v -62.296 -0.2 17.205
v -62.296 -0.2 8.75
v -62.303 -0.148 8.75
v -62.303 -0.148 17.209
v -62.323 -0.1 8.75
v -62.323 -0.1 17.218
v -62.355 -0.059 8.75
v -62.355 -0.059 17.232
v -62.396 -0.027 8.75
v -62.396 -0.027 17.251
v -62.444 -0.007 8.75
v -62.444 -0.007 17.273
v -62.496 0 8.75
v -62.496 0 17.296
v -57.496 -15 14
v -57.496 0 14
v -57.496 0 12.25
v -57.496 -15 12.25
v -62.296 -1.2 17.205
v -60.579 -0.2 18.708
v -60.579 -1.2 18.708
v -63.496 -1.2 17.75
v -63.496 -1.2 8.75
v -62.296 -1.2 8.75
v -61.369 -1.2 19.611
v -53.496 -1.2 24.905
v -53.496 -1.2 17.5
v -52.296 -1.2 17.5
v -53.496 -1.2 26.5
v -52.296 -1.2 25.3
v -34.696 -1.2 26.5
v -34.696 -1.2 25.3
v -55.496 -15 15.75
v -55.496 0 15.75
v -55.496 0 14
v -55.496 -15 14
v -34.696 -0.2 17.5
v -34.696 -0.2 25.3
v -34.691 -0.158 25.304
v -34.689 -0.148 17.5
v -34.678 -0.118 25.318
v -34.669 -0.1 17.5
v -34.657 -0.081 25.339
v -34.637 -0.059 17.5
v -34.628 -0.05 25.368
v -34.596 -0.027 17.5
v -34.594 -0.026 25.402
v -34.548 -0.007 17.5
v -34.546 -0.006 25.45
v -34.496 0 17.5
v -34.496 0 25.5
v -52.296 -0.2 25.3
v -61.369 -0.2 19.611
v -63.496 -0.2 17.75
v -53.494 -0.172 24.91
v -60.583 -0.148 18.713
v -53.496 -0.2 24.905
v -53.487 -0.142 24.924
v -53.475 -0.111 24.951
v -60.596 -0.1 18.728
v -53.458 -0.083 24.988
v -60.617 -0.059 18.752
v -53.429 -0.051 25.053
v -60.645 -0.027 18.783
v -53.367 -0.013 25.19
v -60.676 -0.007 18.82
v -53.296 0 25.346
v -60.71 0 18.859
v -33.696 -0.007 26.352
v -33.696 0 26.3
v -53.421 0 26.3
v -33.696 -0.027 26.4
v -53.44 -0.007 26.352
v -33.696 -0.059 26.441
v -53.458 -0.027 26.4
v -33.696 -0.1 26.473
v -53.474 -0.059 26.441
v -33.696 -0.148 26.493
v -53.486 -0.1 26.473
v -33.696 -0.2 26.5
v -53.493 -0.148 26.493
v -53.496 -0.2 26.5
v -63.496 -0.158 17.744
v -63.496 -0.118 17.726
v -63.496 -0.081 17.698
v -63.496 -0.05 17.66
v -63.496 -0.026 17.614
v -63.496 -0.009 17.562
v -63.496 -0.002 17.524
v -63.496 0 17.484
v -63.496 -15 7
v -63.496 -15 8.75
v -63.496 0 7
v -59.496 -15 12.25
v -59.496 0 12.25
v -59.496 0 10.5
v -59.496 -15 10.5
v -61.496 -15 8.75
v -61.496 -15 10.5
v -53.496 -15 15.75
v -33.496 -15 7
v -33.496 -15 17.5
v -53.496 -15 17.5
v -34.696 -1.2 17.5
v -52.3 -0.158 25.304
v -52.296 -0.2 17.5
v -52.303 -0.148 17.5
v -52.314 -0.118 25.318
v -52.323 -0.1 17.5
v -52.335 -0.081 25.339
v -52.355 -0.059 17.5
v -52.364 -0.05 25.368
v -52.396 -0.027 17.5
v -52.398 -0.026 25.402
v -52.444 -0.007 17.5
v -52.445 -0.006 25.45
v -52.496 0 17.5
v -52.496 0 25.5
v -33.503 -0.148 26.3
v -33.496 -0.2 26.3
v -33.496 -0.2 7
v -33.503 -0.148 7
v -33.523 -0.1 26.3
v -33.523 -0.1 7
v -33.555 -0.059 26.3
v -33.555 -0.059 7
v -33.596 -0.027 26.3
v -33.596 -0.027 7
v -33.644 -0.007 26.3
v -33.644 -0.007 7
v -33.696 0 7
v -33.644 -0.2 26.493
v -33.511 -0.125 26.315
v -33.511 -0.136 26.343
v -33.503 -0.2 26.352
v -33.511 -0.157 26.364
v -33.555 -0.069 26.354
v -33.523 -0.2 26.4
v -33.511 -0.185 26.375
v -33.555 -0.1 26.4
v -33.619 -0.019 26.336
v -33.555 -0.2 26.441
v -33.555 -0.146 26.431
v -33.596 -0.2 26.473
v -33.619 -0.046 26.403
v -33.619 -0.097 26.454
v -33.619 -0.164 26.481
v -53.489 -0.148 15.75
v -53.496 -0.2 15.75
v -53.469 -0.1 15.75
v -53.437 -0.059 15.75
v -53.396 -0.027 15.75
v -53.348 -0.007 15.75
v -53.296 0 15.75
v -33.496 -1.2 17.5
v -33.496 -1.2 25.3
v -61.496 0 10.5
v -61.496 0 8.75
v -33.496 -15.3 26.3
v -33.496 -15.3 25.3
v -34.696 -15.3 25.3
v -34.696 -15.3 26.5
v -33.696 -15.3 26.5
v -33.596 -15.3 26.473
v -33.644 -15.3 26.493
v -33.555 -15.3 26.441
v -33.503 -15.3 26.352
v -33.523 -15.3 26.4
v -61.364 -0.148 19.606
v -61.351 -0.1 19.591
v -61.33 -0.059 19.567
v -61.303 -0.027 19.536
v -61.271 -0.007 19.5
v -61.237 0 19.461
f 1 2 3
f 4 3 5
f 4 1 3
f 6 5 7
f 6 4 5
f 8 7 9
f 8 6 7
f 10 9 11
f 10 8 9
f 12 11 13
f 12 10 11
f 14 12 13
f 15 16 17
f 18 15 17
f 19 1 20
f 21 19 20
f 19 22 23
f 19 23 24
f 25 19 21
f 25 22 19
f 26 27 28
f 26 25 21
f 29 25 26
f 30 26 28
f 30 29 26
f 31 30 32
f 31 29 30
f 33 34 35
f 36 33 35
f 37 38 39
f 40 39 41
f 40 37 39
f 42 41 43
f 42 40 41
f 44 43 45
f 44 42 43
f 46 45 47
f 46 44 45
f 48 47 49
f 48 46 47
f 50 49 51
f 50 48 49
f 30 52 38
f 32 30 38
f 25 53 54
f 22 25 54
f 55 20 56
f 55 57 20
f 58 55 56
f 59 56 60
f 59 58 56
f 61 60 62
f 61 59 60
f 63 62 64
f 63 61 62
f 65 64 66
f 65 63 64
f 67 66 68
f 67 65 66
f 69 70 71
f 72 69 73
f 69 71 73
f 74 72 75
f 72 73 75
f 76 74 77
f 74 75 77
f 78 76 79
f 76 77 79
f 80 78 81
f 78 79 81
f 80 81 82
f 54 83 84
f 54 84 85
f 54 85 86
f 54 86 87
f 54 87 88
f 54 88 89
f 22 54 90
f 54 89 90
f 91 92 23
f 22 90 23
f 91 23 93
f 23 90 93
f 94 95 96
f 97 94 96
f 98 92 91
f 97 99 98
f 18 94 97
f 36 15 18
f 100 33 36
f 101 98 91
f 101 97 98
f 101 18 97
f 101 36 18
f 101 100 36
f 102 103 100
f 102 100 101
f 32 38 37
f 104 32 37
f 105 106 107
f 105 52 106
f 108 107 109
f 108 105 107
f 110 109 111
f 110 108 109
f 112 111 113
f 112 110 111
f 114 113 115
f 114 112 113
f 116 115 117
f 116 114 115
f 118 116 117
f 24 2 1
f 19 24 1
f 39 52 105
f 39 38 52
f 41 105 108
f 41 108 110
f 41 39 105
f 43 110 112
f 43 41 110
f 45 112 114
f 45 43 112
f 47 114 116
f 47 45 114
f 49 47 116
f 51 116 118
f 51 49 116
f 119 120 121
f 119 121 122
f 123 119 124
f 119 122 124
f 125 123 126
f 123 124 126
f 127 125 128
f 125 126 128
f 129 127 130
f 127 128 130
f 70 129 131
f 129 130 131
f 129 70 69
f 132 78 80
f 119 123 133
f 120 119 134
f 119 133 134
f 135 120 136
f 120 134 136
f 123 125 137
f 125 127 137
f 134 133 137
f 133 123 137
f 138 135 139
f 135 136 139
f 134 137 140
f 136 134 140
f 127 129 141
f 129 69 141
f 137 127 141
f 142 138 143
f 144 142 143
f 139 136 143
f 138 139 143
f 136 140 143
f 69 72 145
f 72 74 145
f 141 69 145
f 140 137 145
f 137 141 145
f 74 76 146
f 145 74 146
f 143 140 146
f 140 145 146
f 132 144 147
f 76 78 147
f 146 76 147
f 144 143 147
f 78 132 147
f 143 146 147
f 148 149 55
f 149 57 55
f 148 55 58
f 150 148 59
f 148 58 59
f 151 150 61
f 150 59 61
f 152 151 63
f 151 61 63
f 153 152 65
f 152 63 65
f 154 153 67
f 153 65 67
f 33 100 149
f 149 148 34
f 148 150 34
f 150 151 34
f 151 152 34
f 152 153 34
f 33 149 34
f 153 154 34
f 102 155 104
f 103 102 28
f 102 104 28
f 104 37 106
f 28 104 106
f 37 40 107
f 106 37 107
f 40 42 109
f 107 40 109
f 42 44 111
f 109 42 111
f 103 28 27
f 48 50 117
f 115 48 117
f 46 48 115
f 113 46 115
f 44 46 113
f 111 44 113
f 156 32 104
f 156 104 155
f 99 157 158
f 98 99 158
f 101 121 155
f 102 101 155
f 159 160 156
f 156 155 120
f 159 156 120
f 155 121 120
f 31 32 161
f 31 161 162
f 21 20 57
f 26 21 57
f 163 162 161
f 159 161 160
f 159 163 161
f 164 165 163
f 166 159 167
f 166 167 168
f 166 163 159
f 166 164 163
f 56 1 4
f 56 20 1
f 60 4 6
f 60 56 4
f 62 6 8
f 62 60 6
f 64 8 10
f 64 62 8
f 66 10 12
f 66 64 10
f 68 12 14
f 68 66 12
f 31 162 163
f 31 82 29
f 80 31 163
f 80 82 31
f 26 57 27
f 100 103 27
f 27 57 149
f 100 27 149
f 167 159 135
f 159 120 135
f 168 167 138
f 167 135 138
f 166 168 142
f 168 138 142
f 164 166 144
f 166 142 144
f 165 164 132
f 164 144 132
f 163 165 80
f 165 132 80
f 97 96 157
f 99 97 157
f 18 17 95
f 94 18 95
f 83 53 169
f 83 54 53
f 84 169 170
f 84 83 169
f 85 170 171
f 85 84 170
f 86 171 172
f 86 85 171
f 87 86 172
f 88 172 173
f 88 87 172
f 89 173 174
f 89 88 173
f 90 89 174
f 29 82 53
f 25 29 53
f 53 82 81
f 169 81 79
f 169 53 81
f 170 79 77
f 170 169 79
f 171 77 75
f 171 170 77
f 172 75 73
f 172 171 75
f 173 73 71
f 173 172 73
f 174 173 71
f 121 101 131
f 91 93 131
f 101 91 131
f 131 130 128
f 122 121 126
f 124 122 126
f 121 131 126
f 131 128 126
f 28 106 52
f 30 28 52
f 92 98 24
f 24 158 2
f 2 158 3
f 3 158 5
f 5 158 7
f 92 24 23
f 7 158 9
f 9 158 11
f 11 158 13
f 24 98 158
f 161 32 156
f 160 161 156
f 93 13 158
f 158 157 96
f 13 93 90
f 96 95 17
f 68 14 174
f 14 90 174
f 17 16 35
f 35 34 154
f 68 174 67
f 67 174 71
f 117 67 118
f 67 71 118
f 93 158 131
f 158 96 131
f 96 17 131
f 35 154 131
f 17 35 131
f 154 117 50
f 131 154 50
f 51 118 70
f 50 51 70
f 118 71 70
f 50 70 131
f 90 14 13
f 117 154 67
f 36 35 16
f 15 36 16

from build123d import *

# Parameters (mm, degrees)
F1_DEPTH = 15
F2_DEPTH = 1.2
F3_W     = 1.2
F3_H     = 1.2
F4_DEPTH = 14.1
F5_R     = 0.2


# Not quite as in the source:
# - a feature names something its author has since deleted; it is built from what else it names


with BuildPart() as f1:
    # F0 (on Front) → F1 (new body)
    with BuildSketch(Plane.XZ):
        Polygon((-62.2959427714, 8.75), (-63.4959427714, 8.75), (-63.4959427714, 7), (-36.9959427714, 7), (-33.4959427714, 7), (-33.4959427714, 17.5), (-34.6959427714, 17.5), (-52.2959427714, 17.5), (-53.4959427714, 17.5), (-53.4959427714, 15.75), (-55.4959427714, 15.75), (-55.4959427714, 14), (-57.4959427714, 14), (-57.4959427714, 12.25), (-59.4959427714, 12.25), (-59.4959427714, 10.5), (-61.4959427714, 10.5), (-61.4959427714, 8.75), align=None)
    extrude(amount=F1_DEPTH)

    # F0 (on Front) → F2 (join)
    with BuildSketch(Plane.XZ):
        Polygon((-61.3689829591, 19.6110898358), (-63.4959427714, 17.75), (-63.4959427714, 17.0856158867), (-63.4959427714, 16.1554781281), (-62.2959427714, 17.2054781281), (-60.5787774297, 18.7079978021), align=None)
        Polygon((-62.2959427714, 17.2054781281), (-63.4959427714, 16.1554781281), (-63.4959427714, 8.75), (-62.2959427714, 8.75), align=None)
        Polygon((-52.2959427714, 26.5), (-53.4959427714, 26.5), (-53.4959427714, 24.9054781281), (-53.4959427714, 17.5), (-52.2959427714, 17.5), (-52.2959427714, 25.3), (-52.2959427714, 26), align=None)
        Polygon((-53.4959427714, 26.5), (-61.3689829591, 19.6110898358), (-60.5787774297, 18.7079978021), (-53.4959427714, 24.9054781281), align=None)
        Polygon((-34.6959427714, 26.5), (-52.2959427714, 26.5), (-52.2959427714, 26), (-52.2959427714, 25.3), (-34.6959427714, 25.3), align=None)
        Polygon((-33.4959427714, 26.5), (-34.6959427714, 26.5), (-34.6959427714, 25.3), (-34.6959427714, 17.5), (-33.4959427714, 17.5), align=None)
    extrude(amount=F2_DEPTH)

    # F3 (on face) → F4 (join)
    with BuildSketch(Plane.XZ.offset(1.2)):
        with Locations((-34.0959427714, 25.9)):
            Rectangle(F3_W, F3_H)
    extrude(amount=F4_DEPTH)

    # F5
    f5_edges = [f1.edges().sort_by_distance(p)[0] for p in [
        (-43.495943, 0, 25.3),
        (-34.695943, 0, 21.4),
        (-52.295943, 0, 21.4),
        (-57.895943, 0, 21.055478),
        (-53.495943, 0, 20.327739),
        (-62.295943, 0, 12.977739),
        (-58.495943, 0, 22.125),
        (-43.495943, 0, 26.5),
        (-33.495943, 0, 16.75),
        (-33.495943, -7.65, 26.5),
    ]]
    fillet(f5_edges, radius=F5_R)


solid = f1.part
